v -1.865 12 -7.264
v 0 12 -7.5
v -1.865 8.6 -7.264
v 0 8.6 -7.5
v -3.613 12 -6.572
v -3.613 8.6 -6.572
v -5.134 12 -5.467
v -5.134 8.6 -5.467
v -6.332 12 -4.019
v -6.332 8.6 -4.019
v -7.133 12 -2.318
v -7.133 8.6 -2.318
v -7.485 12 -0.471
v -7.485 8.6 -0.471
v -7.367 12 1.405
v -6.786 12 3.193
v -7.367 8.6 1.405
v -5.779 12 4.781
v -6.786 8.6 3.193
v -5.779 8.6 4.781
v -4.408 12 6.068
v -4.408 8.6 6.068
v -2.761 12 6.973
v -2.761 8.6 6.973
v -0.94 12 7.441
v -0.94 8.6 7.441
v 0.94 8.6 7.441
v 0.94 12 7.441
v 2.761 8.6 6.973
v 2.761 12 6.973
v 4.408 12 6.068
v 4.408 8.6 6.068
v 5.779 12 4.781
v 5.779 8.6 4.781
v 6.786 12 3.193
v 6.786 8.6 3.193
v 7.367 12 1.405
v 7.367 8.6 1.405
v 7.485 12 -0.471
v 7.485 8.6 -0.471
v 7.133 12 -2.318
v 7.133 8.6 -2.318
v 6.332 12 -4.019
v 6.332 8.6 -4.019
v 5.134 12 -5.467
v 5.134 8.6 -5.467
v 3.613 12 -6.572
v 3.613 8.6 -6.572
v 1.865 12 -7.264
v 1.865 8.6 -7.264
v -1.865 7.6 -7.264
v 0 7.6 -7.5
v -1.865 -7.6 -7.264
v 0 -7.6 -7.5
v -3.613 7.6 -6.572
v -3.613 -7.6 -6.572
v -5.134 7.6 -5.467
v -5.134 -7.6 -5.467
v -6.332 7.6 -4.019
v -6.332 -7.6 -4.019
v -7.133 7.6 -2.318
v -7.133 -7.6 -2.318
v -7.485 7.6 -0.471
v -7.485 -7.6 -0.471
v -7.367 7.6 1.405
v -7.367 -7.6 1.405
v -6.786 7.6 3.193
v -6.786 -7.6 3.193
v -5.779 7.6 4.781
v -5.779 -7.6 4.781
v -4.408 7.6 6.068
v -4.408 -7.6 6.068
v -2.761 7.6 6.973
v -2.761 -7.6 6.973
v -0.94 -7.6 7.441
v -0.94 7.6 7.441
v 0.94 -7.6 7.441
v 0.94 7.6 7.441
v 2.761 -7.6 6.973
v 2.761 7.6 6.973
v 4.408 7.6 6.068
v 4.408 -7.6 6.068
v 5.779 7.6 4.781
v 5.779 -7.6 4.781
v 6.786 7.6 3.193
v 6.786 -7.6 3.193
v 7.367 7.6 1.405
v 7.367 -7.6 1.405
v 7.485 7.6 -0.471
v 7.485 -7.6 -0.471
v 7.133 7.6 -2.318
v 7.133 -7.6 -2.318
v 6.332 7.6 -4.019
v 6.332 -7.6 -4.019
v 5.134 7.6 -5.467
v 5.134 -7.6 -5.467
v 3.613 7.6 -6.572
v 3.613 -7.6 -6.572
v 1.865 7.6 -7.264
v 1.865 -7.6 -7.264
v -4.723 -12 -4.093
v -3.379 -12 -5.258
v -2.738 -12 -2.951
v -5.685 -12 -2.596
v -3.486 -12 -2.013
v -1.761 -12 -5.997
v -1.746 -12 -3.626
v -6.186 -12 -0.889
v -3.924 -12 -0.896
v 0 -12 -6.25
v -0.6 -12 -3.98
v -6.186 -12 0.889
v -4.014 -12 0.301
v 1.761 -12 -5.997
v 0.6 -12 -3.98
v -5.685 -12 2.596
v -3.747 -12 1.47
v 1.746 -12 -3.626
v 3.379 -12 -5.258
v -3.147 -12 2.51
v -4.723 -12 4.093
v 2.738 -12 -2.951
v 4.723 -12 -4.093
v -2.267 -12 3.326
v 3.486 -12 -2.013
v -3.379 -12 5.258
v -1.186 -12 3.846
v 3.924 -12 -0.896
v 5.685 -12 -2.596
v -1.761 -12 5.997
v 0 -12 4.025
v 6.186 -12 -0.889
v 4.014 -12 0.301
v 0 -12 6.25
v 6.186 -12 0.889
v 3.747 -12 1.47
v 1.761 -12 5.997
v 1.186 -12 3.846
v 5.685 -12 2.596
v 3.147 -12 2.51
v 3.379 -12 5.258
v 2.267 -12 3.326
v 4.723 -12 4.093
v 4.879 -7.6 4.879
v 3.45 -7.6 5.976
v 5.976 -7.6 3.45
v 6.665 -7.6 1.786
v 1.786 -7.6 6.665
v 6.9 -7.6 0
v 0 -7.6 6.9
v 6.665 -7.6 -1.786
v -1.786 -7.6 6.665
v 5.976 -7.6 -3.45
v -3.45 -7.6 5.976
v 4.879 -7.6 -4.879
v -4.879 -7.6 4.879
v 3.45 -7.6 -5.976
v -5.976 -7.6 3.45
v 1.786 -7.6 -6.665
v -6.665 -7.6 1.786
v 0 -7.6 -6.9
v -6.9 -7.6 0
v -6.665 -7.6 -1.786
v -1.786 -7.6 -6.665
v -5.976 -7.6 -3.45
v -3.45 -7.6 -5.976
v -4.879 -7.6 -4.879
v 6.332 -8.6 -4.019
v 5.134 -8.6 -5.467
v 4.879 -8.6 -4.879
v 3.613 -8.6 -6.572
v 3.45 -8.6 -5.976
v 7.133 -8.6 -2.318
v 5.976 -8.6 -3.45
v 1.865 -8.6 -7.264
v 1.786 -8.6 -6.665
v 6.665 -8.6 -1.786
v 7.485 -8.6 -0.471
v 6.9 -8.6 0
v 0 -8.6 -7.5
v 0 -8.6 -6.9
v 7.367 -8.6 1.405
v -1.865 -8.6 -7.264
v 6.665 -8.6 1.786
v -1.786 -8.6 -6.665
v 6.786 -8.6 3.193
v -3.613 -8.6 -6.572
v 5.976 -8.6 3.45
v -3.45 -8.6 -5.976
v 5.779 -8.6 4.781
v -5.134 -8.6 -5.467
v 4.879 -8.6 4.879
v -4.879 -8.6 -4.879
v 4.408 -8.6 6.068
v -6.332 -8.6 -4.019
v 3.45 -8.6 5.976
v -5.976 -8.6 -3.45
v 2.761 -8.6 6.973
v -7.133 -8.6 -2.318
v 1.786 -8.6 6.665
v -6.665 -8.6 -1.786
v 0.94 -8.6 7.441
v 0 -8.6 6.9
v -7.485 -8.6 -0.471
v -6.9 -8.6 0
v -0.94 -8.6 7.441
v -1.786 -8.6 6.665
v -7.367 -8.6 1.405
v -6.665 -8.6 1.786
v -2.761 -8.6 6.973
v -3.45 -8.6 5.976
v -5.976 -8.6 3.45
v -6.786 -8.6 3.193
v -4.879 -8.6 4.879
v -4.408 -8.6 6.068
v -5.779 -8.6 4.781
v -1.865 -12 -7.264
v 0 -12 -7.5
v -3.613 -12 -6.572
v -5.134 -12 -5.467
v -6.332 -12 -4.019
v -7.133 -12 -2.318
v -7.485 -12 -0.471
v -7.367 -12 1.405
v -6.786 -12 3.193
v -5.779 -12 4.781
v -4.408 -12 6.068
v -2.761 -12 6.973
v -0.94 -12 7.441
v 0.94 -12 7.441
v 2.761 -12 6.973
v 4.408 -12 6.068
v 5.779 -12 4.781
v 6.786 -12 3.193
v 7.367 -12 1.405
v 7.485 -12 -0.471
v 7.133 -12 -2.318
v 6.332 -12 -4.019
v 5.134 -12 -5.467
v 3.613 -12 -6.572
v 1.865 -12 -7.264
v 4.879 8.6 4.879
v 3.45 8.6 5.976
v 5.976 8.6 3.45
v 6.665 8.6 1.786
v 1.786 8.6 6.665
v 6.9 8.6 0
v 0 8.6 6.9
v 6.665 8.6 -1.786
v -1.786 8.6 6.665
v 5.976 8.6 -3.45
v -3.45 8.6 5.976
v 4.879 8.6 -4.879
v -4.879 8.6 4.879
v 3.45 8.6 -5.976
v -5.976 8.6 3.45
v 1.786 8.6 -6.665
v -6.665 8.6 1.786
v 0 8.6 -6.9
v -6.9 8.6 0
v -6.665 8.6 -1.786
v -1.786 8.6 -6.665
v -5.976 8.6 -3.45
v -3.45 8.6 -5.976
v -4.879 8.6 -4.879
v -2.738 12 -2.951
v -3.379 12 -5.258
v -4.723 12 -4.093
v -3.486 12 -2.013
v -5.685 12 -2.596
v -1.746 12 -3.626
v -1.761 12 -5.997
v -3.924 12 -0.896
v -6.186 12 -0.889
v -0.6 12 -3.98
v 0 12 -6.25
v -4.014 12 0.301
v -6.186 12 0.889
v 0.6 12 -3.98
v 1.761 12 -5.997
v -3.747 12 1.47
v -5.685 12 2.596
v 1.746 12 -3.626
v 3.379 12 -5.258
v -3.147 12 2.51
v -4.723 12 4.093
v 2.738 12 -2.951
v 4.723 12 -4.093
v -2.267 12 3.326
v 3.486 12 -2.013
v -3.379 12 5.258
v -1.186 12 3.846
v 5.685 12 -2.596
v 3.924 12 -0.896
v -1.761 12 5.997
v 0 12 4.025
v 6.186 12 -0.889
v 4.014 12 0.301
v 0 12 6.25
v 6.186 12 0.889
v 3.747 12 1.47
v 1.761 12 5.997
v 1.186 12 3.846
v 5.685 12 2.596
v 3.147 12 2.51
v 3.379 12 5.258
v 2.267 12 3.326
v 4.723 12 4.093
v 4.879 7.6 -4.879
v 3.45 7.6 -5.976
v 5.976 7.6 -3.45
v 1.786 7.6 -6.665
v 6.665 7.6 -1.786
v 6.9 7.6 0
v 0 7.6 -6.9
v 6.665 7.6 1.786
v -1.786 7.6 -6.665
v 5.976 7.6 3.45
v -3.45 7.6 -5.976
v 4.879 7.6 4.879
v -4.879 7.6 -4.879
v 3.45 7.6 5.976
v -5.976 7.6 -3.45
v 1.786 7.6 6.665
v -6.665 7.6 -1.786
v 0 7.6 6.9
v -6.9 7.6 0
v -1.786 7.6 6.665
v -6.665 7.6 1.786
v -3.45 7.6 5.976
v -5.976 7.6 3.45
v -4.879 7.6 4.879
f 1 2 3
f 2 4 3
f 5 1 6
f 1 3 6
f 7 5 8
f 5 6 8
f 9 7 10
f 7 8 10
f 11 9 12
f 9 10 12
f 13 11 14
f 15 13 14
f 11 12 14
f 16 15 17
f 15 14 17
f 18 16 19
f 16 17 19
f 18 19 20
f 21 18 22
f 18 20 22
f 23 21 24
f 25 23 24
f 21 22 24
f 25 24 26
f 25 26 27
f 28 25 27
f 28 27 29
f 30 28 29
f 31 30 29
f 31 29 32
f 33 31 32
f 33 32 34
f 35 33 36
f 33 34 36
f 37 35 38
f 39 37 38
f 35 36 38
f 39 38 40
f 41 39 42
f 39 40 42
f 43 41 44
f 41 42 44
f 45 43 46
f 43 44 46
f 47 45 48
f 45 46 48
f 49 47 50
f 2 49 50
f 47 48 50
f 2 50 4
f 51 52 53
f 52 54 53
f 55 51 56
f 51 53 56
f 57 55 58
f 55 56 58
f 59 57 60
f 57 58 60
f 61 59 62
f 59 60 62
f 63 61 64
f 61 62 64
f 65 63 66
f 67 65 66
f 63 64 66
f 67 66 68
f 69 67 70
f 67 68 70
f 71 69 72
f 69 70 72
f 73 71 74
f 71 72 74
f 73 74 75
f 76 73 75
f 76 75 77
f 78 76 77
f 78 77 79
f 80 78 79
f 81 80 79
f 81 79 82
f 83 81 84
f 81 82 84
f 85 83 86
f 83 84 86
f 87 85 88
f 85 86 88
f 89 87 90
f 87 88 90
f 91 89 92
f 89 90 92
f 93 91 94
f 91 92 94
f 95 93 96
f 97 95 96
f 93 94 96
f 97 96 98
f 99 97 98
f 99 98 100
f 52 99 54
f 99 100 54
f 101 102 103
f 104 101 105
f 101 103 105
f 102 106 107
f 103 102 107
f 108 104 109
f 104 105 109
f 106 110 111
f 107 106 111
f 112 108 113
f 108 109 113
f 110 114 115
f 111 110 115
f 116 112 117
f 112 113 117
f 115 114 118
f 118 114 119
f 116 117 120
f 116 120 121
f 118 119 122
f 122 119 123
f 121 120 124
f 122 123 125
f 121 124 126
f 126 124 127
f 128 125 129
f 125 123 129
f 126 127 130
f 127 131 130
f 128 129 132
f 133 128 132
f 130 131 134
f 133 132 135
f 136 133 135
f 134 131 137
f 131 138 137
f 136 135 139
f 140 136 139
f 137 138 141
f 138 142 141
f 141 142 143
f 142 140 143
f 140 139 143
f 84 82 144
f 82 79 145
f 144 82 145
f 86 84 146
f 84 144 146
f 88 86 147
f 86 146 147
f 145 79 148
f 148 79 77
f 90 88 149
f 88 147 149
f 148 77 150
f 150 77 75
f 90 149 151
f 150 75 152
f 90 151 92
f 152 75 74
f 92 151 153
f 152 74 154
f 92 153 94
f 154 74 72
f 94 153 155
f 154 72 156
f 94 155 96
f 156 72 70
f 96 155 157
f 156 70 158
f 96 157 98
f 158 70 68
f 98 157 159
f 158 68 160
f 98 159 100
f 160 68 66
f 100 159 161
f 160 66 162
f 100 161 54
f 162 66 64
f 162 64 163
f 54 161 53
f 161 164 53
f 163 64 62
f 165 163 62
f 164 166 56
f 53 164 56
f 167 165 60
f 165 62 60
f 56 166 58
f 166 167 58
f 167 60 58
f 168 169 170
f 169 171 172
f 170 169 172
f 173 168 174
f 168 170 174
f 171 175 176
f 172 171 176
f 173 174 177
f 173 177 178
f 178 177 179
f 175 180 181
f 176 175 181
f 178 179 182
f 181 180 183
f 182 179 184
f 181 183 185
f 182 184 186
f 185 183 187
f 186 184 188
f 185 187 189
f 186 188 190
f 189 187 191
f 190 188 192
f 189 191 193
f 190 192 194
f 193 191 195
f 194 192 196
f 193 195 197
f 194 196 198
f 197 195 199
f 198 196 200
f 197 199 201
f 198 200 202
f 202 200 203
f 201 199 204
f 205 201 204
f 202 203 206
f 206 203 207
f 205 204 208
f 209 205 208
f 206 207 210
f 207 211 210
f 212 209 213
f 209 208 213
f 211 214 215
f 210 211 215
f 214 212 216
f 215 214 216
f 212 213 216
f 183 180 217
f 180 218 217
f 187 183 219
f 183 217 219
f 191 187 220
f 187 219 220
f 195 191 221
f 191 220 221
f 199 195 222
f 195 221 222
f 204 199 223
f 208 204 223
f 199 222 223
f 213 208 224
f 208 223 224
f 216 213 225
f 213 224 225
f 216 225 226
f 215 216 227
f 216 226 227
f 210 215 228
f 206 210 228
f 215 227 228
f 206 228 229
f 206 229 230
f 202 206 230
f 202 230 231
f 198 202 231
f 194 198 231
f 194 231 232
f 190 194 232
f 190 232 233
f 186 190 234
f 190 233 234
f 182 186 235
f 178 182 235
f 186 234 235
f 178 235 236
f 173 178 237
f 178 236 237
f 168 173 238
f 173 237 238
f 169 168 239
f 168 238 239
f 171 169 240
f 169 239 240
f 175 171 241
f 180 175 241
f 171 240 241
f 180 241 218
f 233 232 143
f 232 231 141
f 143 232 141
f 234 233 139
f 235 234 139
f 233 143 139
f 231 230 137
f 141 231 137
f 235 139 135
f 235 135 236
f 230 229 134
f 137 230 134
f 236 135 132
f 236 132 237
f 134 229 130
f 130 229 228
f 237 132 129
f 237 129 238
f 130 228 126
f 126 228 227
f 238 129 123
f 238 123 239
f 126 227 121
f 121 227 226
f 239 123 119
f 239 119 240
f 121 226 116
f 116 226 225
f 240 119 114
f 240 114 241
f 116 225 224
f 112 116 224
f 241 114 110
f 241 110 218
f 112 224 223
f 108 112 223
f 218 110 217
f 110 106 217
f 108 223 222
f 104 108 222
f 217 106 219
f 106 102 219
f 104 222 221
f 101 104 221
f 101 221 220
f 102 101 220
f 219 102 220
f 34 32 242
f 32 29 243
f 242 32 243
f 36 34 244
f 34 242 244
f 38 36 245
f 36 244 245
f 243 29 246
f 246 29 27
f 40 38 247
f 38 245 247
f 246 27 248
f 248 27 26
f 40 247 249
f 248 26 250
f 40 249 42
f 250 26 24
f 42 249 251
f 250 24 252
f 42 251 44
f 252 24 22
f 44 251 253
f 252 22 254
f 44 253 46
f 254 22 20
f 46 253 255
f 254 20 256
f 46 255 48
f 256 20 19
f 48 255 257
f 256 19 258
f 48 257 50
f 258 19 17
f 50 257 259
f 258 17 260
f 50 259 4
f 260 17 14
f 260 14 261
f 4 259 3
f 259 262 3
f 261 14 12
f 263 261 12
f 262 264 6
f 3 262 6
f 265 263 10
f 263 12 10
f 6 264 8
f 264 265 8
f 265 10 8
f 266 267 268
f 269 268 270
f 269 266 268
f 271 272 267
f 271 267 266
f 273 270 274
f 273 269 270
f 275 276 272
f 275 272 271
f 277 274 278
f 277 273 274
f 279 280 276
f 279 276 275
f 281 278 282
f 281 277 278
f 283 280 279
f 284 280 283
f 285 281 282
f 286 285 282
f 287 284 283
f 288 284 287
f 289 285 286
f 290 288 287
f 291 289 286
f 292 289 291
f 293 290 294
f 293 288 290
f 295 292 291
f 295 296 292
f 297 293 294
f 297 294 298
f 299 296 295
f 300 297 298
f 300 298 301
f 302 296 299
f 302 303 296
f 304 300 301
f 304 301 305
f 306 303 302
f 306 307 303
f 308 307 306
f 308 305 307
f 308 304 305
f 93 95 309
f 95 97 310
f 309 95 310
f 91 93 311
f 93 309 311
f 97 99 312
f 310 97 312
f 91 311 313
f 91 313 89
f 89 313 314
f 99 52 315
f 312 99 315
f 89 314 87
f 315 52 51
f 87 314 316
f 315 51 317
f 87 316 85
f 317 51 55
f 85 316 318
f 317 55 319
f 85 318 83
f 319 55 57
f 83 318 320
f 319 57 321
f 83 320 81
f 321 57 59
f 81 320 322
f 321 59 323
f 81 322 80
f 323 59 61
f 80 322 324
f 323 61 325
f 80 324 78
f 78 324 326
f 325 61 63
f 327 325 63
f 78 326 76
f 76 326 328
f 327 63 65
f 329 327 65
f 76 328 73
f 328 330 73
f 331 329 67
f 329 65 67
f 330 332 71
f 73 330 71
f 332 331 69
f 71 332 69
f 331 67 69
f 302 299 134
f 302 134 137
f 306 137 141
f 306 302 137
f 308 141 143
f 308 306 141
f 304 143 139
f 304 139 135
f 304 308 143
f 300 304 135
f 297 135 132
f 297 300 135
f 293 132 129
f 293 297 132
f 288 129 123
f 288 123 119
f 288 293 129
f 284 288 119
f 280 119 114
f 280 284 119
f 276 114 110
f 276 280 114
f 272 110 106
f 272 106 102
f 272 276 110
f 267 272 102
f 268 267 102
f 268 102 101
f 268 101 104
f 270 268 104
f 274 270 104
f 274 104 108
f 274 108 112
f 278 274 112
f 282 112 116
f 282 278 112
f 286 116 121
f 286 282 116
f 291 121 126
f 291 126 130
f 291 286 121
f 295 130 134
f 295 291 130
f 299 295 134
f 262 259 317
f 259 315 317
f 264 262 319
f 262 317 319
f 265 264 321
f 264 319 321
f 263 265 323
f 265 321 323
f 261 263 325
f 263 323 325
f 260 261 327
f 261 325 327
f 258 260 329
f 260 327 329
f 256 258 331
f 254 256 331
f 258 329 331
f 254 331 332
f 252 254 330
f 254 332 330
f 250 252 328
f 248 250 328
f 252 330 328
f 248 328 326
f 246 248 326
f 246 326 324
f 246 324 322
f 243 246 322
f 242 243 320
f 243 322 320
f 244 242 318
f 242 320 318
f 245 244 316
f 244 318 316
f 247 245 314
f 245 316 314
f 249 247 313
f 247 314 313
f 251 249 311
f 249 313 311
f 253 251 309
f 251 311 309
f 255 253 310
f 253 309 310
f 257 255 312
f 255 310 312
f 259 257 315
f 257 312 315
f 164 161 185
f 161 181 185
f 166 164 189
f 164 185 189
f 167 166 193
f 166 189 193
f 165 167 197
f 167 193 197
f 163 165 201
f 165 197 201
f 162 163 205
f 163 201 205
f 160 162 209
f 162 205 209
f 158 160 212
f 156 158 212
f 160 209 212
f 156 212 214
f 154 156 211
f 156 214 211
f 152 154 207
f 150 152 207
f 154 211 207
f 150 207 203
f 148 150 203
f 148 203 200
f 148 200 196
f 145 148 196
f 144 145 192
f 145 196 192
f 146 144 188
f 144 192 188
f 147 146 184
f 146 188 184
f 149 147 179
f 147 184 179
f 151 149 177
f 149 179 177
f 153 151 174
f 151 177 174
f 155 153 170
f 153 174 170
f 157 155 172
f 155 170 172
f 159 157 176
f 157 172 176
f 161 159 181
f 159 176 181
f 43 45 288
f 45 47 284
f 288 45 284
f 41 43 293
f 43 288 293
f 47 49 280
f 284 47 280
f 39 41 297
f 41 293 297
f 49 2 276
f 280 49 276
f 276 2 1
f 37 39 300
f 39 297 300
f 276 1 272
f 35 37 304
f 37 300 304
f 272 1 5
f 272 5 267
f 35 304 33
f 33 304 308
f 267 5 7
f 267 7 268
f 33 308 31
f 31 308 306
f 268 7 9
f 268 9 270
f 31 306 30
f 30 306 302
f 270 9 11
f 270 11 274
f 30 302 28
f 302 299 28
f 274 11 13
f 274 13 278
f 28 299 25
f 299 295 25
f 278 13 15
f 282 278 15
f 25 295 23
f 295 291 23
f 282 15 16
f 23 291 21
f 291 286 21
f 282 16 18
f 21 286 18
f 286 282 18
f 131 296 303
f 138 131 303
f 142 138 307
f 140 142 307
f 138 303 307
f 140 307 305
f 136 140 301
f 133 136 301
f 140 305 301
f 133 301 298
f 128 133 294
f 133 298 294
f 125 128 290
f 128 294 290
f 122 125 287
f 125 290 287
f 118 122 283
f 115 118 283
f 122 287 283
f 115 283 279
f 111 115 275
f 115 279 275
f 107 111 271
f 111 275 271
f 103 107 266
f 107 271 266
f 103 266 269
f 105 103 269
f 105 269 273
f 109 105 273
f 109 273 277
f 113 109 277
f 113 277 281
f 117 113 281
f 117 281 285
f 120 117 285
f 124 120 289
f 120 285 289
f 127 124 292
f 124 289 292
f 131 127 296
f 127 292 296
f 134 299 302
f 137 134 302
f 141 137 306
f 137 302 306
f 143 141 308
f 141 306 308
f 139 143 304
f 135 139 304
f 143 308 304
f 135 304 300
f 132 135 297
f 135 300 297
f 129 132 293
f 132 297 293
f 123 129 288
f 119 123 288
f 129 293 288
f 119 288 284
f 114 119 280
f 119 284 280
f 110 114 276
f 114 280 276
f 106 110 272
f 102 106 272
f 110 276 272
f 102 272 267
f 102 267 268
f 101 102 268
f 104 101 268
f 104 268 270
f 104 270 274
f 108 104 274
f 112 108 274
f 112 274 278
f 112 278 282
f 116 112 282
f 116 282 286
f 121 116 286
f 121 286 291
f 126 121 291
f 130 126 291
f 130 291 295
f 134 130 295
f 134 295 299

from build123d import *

# Parameters (mm, degrees)
CROQUIS2_R              = 6.25
CORTAR_EXTRUIR1_DEPTH   = 27.239283527
CROQUIS3_R              = 6.25
CROQUIS3_R_2            = 4.025
SALIENTE_EXTRUIR1_DEPTH = 24


with BuildPart() as part:
    # Croquis1 → Revolución2 (revolve)
    with BuildSketch(Plane.XY, mode=Mode.PRIVATE) as revoluci_n2_sk:
        Polygon((0, -12), (0, 12), (7.5, 12), (7.5, 8.6), (6.9, 8.6), (6.9, 7.6), (7.5, 7.6), (7.5, -7.6), (6.9, -7.6), (6.9, -8.6), (7.5, -8.6), (7.5, -12), align=None)
    revolve(revoluci_n2_sk.sketch.rotate(Axis((0, -12, 0), (0, 1, 0)), 90), axis=Axis((0, -12, 0), (0, 1, 0)))

    # Croquis2 → Cortar-Extruir1 (cut, through all)
    with BuildSketch(Plane(origin=(0, 12, 0), x_dir=(1, 0, 0), z_dir=(0, 1, 0))):
        with Locations(Location((0, 0, 0), (0, 0, 270))):
            Circle(CROQUIS2_R)
    extrude(amount=-CORTAR_EXTRUIR1_DEPTH, mode=Mode.SUBTRACT)


with BuildPart() as body_2:
    # Croquis3 → Saliente-Extruir1 (new body)
    with BuildSketch(Plane(origin=(0, 12, 0), x_dir=(1, 0, 0), z_dir=(0, 1, 0))):
        with Locations(Location((0, 0, 0), (0, 0, 270))):
            Circle(CROQUIS3_R)
        with Locations(Location((0, 0, 0), (0, 0, 270))):
            Circle(CROQUIS3_R_2, mode=Mode.SUBTRACT)
    extrude(amount=-SALIENTE_EXTRUIR1_DEPTH)


solid = Compound([part.part, body_2.part])
